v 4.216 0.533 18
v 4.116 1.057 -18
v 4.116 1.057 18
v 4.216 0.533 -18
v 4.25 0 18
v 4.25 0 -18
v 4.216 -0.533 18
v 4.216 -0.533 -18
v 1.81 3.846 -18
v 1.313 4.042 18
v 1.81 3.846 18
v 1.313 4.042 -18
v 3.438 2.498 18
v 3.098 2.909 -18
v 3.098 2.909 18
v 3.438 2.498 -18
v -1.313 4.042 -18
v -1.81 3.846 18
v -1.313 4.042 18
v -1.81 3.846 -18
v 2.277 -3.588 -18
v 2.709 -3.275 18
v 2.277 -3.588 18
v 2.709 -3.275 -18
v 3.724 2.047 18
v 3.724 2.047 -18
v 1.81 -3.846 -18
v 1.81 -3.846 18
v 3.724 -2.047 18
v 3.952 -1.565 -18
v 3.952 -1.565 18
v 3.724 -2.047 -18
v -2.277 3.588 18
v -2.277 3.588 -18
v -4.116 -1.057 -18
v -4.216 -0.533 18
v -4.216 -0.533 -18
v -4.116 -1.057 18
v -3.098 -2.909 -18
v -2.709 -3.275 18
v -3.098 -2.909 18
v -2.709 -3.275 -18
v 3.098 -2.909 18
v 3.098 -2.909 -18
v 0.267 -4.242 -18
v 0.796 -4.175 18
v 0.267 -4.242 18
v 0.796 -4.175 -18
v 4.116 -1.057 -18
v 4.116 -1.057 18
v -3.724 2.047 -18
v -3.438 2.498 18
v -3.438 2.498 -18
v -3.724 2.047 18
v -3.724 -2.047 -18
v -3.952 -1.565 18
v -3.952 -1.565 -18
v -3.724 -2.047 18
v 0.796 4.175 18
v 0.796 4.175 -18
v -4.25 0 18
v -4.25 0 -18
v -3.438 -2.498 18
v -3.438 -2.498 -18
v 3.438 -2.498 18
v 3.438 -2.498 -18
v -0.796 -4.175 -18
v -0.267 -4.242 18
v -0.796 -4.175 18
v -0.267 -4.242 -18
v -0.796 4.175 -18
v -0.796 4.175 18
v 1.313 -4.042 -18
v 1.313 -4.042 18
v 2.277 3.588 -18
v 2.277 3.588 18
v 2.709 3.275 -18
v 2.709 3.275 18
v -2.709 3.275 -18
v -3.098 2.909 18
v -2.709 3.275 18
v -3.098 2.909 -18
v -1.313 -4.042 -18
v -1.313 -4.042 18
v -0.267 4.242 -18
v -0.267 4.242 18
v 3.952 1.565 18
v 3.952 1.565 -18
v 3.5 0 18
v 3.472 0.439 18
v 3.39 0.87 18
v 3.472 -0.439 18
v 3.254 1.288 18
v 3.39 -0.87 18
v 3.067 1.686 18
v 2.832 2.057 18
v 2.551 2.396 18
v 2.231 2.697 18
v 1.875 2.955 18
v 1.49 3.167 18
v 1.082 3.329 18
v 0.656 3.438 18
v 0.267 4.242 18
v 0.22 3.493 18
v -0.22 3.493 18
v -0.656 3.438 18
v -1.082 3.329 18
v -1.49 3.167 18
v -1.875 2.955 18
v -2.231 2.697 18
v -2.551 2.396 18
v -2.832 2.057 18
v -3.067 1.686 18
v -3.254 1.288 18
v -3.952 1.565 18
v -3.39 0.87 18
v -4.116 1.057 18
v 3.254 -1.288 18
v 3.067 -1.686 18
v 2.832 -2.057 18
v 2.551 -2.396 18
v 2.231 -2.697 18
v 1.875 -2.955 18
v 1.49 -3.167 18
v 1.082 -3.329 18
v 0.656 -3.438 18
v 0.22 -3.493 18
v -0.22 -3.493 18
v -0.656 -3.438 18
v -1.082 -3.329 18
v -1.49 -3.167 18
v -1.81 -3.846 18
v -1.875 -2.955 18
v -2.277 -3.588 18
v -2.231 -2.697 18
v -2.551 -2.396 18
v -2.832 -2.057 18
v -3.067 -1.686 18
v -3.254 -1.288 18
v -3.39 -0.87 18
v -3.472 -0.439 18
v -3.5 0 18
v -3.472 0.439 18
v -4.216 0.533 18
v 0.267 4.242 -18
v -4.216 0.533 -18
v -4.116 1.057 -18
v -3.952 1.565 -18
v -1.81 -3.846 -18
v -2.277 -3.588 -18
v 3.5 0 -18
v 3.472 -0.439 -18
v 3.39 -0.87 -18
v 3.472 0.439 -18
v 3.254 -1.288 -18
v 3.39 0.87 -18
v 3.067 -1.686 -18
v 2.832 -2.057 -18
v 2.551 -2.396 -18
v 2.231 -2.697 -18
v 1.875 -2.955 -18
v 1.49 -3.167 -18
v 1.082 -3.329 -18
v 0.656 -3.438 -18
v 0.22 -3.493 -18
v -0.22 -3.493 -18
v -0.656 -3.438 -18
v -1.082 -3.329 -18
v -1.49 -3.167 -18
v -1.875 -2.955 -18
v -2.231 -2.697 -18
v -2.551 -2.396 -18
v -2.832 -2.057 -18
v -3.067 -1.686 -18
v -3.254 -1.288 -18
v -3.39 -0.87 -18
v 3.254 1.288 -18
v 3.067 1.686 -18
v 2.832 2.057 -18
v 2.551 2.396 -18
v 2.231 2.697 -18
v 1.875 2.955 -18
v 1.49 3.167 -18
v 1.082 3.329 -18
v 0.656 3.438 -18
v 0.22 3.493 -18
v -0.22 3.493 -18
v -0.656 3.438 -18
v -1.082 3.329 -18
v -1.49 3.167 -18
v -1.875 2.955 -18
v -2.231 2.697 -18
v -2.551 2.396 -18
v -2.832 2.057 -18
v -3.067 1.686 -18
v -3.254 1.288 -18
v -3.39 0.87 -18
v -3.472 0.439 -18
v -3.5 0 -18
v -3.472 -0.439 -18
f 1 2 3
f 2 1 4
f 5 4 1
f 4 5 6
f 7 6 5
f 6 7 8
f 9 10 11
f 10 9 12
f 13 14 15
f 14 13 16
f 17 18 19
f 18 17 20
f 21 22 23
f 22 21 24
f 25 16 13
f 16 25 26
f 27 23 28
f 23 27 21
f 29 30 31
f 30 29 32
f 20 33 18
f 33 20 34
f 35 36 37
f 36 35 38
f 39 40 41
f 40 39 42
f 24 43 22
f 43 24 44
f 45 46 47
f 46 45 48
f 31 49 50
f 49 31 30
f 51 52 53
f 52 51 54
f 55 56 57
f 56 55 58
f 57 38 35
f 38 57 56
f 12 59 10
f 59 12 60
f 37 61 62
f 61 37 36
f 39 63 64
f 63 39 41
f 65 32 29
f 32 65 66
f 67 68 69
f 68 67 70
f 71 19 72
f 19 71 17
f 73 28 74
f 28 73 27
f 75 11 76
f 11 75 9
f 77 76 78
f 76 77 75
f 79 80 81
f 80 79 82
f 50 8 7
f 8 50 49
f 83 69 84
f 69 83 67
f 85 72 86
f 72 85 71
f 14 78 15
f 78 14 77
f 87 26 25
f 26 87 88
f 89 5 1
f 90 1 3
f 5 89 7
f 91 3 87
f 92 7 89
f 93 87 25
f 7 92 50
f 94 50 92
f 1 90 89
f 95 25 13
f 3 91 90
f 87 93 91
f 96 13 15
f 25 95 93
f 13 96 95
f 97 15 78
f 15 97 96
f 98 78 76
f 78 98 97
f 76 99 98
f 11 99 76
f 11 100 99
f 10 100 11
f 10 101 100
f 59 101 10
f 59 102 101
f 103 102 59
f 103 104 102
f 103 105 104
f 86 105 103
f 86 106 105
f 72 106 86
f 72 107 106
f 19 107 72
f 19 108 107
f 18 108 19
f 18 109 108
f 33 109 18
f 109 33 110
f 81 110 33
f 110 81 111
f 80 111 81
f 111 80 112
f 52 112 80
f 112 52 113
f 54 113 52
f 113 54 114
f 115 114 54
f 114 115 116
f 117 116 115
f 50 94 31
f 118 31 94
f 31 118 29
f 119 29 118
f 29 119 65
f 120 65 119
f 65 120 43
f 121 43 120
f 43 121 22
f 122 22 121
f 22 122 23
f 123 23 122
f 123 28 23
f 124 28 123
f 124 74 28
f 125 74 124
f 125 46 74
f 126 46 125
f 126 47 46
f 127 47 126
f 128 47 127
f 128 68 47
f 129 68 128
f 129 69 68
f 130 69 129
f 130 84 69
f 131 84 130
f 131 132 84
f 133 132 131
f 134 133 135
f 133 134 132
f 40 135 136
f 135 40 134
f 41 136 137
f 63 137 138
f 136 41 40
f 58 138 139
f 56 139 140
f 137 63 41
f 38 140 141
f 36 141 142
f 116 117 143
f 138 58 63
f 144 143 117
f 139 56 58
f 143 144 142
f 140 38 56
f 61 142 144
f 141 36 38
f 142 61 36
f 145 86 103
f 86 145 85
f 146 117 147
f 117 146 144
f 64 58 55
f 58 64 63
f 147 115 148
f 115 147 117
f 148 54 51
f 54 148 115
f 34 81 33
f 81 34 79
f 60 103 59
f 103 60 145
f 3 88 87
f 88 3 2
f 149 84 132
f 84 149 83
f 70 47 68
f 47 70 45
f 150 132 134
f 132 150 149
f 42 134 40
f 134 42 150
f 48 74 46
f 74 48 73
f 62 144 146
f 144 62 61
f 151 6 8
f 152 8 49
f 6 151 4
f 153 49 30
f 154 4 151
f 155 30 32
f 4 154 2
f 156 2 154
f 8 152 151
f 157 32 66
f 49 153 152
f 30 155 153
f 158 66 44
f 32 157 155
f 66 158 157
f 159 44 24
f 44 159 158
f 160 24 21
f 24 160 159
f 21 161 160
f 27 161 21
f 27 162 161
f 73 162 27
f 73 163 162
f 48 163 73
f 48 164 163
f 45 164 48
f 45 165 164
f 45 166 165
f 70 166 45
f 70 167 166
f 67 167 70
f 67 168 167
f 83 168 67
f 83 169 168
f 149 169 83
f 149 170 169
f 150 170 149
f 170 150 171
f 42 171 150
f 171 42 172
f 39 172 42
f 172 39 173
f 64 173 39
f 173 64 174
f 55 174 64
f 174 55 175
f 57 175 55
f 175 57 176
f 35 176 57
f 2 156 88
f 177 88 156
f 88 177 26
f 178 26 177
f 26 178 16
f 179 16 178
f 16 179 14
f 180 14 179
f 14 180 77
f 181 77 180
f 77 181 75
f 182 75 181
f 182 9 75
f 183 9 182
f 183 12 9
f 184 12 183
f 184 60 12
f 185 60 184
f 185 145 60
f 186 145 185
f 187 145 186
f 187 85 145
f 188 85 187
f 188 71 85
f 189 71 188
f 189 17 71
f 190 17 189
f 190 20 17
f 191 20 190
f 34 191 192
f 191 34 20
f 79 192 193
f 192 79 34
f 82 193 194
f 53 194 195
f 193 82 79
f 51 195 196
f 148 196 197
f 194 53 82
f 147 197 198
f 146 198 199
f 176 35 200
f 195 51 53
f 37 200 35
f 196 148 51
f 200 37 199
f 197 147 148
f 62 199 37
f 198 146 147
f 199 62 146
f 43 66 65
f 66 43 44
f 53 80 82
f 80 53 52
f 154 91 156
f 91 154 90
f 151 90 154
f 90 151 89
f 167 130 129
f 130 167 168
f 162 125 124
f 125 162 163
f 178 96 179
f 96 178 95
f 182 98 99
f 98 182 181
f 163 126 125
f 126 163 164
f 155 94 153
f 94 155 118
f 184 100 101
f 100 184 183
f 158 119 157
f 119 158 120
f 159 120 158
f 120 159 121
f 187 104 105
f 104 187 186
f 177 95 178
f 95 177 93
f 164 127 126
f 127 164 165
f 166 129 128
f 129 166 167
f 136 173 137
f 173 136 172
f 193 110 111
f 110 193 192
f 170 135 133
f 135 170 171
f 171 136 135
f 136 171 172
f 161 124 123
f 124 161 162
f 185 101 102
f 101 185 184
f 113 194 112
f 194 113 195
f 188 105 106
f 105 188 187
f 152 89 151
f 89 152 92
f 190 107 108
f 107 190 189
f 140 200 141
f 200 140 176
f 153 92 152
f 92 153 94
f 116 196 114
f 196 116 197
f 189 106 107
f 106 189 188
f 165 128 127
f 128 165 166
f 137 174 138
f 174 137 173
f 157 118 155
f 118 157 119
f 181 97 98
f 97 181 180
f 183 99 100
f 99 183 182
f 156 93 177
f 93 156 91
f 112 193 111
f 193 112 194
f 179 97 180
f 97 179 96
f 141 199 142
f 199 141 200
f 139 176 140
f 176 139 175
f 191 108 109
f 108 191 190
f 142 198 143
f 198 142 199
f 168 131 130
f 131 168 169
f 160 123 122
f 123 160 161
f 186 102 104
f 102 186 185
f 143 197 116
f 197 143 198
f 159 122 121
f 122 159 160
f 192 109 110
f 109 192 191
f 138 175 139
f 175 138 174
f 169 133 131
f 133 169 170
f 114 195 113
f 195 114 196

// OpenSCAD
$fn = 50;


difference() {
	union() {
		translate(v = [0, 0, -18.0000000000]) {
			cylinder(h = 36, r = 4.2500000000);
		}
	}
	union() {
		translate(v = [0, 0, -100.0000000000]) {
			cylinder(h = 200, r = 3.5000000000);
		}
	}
}
